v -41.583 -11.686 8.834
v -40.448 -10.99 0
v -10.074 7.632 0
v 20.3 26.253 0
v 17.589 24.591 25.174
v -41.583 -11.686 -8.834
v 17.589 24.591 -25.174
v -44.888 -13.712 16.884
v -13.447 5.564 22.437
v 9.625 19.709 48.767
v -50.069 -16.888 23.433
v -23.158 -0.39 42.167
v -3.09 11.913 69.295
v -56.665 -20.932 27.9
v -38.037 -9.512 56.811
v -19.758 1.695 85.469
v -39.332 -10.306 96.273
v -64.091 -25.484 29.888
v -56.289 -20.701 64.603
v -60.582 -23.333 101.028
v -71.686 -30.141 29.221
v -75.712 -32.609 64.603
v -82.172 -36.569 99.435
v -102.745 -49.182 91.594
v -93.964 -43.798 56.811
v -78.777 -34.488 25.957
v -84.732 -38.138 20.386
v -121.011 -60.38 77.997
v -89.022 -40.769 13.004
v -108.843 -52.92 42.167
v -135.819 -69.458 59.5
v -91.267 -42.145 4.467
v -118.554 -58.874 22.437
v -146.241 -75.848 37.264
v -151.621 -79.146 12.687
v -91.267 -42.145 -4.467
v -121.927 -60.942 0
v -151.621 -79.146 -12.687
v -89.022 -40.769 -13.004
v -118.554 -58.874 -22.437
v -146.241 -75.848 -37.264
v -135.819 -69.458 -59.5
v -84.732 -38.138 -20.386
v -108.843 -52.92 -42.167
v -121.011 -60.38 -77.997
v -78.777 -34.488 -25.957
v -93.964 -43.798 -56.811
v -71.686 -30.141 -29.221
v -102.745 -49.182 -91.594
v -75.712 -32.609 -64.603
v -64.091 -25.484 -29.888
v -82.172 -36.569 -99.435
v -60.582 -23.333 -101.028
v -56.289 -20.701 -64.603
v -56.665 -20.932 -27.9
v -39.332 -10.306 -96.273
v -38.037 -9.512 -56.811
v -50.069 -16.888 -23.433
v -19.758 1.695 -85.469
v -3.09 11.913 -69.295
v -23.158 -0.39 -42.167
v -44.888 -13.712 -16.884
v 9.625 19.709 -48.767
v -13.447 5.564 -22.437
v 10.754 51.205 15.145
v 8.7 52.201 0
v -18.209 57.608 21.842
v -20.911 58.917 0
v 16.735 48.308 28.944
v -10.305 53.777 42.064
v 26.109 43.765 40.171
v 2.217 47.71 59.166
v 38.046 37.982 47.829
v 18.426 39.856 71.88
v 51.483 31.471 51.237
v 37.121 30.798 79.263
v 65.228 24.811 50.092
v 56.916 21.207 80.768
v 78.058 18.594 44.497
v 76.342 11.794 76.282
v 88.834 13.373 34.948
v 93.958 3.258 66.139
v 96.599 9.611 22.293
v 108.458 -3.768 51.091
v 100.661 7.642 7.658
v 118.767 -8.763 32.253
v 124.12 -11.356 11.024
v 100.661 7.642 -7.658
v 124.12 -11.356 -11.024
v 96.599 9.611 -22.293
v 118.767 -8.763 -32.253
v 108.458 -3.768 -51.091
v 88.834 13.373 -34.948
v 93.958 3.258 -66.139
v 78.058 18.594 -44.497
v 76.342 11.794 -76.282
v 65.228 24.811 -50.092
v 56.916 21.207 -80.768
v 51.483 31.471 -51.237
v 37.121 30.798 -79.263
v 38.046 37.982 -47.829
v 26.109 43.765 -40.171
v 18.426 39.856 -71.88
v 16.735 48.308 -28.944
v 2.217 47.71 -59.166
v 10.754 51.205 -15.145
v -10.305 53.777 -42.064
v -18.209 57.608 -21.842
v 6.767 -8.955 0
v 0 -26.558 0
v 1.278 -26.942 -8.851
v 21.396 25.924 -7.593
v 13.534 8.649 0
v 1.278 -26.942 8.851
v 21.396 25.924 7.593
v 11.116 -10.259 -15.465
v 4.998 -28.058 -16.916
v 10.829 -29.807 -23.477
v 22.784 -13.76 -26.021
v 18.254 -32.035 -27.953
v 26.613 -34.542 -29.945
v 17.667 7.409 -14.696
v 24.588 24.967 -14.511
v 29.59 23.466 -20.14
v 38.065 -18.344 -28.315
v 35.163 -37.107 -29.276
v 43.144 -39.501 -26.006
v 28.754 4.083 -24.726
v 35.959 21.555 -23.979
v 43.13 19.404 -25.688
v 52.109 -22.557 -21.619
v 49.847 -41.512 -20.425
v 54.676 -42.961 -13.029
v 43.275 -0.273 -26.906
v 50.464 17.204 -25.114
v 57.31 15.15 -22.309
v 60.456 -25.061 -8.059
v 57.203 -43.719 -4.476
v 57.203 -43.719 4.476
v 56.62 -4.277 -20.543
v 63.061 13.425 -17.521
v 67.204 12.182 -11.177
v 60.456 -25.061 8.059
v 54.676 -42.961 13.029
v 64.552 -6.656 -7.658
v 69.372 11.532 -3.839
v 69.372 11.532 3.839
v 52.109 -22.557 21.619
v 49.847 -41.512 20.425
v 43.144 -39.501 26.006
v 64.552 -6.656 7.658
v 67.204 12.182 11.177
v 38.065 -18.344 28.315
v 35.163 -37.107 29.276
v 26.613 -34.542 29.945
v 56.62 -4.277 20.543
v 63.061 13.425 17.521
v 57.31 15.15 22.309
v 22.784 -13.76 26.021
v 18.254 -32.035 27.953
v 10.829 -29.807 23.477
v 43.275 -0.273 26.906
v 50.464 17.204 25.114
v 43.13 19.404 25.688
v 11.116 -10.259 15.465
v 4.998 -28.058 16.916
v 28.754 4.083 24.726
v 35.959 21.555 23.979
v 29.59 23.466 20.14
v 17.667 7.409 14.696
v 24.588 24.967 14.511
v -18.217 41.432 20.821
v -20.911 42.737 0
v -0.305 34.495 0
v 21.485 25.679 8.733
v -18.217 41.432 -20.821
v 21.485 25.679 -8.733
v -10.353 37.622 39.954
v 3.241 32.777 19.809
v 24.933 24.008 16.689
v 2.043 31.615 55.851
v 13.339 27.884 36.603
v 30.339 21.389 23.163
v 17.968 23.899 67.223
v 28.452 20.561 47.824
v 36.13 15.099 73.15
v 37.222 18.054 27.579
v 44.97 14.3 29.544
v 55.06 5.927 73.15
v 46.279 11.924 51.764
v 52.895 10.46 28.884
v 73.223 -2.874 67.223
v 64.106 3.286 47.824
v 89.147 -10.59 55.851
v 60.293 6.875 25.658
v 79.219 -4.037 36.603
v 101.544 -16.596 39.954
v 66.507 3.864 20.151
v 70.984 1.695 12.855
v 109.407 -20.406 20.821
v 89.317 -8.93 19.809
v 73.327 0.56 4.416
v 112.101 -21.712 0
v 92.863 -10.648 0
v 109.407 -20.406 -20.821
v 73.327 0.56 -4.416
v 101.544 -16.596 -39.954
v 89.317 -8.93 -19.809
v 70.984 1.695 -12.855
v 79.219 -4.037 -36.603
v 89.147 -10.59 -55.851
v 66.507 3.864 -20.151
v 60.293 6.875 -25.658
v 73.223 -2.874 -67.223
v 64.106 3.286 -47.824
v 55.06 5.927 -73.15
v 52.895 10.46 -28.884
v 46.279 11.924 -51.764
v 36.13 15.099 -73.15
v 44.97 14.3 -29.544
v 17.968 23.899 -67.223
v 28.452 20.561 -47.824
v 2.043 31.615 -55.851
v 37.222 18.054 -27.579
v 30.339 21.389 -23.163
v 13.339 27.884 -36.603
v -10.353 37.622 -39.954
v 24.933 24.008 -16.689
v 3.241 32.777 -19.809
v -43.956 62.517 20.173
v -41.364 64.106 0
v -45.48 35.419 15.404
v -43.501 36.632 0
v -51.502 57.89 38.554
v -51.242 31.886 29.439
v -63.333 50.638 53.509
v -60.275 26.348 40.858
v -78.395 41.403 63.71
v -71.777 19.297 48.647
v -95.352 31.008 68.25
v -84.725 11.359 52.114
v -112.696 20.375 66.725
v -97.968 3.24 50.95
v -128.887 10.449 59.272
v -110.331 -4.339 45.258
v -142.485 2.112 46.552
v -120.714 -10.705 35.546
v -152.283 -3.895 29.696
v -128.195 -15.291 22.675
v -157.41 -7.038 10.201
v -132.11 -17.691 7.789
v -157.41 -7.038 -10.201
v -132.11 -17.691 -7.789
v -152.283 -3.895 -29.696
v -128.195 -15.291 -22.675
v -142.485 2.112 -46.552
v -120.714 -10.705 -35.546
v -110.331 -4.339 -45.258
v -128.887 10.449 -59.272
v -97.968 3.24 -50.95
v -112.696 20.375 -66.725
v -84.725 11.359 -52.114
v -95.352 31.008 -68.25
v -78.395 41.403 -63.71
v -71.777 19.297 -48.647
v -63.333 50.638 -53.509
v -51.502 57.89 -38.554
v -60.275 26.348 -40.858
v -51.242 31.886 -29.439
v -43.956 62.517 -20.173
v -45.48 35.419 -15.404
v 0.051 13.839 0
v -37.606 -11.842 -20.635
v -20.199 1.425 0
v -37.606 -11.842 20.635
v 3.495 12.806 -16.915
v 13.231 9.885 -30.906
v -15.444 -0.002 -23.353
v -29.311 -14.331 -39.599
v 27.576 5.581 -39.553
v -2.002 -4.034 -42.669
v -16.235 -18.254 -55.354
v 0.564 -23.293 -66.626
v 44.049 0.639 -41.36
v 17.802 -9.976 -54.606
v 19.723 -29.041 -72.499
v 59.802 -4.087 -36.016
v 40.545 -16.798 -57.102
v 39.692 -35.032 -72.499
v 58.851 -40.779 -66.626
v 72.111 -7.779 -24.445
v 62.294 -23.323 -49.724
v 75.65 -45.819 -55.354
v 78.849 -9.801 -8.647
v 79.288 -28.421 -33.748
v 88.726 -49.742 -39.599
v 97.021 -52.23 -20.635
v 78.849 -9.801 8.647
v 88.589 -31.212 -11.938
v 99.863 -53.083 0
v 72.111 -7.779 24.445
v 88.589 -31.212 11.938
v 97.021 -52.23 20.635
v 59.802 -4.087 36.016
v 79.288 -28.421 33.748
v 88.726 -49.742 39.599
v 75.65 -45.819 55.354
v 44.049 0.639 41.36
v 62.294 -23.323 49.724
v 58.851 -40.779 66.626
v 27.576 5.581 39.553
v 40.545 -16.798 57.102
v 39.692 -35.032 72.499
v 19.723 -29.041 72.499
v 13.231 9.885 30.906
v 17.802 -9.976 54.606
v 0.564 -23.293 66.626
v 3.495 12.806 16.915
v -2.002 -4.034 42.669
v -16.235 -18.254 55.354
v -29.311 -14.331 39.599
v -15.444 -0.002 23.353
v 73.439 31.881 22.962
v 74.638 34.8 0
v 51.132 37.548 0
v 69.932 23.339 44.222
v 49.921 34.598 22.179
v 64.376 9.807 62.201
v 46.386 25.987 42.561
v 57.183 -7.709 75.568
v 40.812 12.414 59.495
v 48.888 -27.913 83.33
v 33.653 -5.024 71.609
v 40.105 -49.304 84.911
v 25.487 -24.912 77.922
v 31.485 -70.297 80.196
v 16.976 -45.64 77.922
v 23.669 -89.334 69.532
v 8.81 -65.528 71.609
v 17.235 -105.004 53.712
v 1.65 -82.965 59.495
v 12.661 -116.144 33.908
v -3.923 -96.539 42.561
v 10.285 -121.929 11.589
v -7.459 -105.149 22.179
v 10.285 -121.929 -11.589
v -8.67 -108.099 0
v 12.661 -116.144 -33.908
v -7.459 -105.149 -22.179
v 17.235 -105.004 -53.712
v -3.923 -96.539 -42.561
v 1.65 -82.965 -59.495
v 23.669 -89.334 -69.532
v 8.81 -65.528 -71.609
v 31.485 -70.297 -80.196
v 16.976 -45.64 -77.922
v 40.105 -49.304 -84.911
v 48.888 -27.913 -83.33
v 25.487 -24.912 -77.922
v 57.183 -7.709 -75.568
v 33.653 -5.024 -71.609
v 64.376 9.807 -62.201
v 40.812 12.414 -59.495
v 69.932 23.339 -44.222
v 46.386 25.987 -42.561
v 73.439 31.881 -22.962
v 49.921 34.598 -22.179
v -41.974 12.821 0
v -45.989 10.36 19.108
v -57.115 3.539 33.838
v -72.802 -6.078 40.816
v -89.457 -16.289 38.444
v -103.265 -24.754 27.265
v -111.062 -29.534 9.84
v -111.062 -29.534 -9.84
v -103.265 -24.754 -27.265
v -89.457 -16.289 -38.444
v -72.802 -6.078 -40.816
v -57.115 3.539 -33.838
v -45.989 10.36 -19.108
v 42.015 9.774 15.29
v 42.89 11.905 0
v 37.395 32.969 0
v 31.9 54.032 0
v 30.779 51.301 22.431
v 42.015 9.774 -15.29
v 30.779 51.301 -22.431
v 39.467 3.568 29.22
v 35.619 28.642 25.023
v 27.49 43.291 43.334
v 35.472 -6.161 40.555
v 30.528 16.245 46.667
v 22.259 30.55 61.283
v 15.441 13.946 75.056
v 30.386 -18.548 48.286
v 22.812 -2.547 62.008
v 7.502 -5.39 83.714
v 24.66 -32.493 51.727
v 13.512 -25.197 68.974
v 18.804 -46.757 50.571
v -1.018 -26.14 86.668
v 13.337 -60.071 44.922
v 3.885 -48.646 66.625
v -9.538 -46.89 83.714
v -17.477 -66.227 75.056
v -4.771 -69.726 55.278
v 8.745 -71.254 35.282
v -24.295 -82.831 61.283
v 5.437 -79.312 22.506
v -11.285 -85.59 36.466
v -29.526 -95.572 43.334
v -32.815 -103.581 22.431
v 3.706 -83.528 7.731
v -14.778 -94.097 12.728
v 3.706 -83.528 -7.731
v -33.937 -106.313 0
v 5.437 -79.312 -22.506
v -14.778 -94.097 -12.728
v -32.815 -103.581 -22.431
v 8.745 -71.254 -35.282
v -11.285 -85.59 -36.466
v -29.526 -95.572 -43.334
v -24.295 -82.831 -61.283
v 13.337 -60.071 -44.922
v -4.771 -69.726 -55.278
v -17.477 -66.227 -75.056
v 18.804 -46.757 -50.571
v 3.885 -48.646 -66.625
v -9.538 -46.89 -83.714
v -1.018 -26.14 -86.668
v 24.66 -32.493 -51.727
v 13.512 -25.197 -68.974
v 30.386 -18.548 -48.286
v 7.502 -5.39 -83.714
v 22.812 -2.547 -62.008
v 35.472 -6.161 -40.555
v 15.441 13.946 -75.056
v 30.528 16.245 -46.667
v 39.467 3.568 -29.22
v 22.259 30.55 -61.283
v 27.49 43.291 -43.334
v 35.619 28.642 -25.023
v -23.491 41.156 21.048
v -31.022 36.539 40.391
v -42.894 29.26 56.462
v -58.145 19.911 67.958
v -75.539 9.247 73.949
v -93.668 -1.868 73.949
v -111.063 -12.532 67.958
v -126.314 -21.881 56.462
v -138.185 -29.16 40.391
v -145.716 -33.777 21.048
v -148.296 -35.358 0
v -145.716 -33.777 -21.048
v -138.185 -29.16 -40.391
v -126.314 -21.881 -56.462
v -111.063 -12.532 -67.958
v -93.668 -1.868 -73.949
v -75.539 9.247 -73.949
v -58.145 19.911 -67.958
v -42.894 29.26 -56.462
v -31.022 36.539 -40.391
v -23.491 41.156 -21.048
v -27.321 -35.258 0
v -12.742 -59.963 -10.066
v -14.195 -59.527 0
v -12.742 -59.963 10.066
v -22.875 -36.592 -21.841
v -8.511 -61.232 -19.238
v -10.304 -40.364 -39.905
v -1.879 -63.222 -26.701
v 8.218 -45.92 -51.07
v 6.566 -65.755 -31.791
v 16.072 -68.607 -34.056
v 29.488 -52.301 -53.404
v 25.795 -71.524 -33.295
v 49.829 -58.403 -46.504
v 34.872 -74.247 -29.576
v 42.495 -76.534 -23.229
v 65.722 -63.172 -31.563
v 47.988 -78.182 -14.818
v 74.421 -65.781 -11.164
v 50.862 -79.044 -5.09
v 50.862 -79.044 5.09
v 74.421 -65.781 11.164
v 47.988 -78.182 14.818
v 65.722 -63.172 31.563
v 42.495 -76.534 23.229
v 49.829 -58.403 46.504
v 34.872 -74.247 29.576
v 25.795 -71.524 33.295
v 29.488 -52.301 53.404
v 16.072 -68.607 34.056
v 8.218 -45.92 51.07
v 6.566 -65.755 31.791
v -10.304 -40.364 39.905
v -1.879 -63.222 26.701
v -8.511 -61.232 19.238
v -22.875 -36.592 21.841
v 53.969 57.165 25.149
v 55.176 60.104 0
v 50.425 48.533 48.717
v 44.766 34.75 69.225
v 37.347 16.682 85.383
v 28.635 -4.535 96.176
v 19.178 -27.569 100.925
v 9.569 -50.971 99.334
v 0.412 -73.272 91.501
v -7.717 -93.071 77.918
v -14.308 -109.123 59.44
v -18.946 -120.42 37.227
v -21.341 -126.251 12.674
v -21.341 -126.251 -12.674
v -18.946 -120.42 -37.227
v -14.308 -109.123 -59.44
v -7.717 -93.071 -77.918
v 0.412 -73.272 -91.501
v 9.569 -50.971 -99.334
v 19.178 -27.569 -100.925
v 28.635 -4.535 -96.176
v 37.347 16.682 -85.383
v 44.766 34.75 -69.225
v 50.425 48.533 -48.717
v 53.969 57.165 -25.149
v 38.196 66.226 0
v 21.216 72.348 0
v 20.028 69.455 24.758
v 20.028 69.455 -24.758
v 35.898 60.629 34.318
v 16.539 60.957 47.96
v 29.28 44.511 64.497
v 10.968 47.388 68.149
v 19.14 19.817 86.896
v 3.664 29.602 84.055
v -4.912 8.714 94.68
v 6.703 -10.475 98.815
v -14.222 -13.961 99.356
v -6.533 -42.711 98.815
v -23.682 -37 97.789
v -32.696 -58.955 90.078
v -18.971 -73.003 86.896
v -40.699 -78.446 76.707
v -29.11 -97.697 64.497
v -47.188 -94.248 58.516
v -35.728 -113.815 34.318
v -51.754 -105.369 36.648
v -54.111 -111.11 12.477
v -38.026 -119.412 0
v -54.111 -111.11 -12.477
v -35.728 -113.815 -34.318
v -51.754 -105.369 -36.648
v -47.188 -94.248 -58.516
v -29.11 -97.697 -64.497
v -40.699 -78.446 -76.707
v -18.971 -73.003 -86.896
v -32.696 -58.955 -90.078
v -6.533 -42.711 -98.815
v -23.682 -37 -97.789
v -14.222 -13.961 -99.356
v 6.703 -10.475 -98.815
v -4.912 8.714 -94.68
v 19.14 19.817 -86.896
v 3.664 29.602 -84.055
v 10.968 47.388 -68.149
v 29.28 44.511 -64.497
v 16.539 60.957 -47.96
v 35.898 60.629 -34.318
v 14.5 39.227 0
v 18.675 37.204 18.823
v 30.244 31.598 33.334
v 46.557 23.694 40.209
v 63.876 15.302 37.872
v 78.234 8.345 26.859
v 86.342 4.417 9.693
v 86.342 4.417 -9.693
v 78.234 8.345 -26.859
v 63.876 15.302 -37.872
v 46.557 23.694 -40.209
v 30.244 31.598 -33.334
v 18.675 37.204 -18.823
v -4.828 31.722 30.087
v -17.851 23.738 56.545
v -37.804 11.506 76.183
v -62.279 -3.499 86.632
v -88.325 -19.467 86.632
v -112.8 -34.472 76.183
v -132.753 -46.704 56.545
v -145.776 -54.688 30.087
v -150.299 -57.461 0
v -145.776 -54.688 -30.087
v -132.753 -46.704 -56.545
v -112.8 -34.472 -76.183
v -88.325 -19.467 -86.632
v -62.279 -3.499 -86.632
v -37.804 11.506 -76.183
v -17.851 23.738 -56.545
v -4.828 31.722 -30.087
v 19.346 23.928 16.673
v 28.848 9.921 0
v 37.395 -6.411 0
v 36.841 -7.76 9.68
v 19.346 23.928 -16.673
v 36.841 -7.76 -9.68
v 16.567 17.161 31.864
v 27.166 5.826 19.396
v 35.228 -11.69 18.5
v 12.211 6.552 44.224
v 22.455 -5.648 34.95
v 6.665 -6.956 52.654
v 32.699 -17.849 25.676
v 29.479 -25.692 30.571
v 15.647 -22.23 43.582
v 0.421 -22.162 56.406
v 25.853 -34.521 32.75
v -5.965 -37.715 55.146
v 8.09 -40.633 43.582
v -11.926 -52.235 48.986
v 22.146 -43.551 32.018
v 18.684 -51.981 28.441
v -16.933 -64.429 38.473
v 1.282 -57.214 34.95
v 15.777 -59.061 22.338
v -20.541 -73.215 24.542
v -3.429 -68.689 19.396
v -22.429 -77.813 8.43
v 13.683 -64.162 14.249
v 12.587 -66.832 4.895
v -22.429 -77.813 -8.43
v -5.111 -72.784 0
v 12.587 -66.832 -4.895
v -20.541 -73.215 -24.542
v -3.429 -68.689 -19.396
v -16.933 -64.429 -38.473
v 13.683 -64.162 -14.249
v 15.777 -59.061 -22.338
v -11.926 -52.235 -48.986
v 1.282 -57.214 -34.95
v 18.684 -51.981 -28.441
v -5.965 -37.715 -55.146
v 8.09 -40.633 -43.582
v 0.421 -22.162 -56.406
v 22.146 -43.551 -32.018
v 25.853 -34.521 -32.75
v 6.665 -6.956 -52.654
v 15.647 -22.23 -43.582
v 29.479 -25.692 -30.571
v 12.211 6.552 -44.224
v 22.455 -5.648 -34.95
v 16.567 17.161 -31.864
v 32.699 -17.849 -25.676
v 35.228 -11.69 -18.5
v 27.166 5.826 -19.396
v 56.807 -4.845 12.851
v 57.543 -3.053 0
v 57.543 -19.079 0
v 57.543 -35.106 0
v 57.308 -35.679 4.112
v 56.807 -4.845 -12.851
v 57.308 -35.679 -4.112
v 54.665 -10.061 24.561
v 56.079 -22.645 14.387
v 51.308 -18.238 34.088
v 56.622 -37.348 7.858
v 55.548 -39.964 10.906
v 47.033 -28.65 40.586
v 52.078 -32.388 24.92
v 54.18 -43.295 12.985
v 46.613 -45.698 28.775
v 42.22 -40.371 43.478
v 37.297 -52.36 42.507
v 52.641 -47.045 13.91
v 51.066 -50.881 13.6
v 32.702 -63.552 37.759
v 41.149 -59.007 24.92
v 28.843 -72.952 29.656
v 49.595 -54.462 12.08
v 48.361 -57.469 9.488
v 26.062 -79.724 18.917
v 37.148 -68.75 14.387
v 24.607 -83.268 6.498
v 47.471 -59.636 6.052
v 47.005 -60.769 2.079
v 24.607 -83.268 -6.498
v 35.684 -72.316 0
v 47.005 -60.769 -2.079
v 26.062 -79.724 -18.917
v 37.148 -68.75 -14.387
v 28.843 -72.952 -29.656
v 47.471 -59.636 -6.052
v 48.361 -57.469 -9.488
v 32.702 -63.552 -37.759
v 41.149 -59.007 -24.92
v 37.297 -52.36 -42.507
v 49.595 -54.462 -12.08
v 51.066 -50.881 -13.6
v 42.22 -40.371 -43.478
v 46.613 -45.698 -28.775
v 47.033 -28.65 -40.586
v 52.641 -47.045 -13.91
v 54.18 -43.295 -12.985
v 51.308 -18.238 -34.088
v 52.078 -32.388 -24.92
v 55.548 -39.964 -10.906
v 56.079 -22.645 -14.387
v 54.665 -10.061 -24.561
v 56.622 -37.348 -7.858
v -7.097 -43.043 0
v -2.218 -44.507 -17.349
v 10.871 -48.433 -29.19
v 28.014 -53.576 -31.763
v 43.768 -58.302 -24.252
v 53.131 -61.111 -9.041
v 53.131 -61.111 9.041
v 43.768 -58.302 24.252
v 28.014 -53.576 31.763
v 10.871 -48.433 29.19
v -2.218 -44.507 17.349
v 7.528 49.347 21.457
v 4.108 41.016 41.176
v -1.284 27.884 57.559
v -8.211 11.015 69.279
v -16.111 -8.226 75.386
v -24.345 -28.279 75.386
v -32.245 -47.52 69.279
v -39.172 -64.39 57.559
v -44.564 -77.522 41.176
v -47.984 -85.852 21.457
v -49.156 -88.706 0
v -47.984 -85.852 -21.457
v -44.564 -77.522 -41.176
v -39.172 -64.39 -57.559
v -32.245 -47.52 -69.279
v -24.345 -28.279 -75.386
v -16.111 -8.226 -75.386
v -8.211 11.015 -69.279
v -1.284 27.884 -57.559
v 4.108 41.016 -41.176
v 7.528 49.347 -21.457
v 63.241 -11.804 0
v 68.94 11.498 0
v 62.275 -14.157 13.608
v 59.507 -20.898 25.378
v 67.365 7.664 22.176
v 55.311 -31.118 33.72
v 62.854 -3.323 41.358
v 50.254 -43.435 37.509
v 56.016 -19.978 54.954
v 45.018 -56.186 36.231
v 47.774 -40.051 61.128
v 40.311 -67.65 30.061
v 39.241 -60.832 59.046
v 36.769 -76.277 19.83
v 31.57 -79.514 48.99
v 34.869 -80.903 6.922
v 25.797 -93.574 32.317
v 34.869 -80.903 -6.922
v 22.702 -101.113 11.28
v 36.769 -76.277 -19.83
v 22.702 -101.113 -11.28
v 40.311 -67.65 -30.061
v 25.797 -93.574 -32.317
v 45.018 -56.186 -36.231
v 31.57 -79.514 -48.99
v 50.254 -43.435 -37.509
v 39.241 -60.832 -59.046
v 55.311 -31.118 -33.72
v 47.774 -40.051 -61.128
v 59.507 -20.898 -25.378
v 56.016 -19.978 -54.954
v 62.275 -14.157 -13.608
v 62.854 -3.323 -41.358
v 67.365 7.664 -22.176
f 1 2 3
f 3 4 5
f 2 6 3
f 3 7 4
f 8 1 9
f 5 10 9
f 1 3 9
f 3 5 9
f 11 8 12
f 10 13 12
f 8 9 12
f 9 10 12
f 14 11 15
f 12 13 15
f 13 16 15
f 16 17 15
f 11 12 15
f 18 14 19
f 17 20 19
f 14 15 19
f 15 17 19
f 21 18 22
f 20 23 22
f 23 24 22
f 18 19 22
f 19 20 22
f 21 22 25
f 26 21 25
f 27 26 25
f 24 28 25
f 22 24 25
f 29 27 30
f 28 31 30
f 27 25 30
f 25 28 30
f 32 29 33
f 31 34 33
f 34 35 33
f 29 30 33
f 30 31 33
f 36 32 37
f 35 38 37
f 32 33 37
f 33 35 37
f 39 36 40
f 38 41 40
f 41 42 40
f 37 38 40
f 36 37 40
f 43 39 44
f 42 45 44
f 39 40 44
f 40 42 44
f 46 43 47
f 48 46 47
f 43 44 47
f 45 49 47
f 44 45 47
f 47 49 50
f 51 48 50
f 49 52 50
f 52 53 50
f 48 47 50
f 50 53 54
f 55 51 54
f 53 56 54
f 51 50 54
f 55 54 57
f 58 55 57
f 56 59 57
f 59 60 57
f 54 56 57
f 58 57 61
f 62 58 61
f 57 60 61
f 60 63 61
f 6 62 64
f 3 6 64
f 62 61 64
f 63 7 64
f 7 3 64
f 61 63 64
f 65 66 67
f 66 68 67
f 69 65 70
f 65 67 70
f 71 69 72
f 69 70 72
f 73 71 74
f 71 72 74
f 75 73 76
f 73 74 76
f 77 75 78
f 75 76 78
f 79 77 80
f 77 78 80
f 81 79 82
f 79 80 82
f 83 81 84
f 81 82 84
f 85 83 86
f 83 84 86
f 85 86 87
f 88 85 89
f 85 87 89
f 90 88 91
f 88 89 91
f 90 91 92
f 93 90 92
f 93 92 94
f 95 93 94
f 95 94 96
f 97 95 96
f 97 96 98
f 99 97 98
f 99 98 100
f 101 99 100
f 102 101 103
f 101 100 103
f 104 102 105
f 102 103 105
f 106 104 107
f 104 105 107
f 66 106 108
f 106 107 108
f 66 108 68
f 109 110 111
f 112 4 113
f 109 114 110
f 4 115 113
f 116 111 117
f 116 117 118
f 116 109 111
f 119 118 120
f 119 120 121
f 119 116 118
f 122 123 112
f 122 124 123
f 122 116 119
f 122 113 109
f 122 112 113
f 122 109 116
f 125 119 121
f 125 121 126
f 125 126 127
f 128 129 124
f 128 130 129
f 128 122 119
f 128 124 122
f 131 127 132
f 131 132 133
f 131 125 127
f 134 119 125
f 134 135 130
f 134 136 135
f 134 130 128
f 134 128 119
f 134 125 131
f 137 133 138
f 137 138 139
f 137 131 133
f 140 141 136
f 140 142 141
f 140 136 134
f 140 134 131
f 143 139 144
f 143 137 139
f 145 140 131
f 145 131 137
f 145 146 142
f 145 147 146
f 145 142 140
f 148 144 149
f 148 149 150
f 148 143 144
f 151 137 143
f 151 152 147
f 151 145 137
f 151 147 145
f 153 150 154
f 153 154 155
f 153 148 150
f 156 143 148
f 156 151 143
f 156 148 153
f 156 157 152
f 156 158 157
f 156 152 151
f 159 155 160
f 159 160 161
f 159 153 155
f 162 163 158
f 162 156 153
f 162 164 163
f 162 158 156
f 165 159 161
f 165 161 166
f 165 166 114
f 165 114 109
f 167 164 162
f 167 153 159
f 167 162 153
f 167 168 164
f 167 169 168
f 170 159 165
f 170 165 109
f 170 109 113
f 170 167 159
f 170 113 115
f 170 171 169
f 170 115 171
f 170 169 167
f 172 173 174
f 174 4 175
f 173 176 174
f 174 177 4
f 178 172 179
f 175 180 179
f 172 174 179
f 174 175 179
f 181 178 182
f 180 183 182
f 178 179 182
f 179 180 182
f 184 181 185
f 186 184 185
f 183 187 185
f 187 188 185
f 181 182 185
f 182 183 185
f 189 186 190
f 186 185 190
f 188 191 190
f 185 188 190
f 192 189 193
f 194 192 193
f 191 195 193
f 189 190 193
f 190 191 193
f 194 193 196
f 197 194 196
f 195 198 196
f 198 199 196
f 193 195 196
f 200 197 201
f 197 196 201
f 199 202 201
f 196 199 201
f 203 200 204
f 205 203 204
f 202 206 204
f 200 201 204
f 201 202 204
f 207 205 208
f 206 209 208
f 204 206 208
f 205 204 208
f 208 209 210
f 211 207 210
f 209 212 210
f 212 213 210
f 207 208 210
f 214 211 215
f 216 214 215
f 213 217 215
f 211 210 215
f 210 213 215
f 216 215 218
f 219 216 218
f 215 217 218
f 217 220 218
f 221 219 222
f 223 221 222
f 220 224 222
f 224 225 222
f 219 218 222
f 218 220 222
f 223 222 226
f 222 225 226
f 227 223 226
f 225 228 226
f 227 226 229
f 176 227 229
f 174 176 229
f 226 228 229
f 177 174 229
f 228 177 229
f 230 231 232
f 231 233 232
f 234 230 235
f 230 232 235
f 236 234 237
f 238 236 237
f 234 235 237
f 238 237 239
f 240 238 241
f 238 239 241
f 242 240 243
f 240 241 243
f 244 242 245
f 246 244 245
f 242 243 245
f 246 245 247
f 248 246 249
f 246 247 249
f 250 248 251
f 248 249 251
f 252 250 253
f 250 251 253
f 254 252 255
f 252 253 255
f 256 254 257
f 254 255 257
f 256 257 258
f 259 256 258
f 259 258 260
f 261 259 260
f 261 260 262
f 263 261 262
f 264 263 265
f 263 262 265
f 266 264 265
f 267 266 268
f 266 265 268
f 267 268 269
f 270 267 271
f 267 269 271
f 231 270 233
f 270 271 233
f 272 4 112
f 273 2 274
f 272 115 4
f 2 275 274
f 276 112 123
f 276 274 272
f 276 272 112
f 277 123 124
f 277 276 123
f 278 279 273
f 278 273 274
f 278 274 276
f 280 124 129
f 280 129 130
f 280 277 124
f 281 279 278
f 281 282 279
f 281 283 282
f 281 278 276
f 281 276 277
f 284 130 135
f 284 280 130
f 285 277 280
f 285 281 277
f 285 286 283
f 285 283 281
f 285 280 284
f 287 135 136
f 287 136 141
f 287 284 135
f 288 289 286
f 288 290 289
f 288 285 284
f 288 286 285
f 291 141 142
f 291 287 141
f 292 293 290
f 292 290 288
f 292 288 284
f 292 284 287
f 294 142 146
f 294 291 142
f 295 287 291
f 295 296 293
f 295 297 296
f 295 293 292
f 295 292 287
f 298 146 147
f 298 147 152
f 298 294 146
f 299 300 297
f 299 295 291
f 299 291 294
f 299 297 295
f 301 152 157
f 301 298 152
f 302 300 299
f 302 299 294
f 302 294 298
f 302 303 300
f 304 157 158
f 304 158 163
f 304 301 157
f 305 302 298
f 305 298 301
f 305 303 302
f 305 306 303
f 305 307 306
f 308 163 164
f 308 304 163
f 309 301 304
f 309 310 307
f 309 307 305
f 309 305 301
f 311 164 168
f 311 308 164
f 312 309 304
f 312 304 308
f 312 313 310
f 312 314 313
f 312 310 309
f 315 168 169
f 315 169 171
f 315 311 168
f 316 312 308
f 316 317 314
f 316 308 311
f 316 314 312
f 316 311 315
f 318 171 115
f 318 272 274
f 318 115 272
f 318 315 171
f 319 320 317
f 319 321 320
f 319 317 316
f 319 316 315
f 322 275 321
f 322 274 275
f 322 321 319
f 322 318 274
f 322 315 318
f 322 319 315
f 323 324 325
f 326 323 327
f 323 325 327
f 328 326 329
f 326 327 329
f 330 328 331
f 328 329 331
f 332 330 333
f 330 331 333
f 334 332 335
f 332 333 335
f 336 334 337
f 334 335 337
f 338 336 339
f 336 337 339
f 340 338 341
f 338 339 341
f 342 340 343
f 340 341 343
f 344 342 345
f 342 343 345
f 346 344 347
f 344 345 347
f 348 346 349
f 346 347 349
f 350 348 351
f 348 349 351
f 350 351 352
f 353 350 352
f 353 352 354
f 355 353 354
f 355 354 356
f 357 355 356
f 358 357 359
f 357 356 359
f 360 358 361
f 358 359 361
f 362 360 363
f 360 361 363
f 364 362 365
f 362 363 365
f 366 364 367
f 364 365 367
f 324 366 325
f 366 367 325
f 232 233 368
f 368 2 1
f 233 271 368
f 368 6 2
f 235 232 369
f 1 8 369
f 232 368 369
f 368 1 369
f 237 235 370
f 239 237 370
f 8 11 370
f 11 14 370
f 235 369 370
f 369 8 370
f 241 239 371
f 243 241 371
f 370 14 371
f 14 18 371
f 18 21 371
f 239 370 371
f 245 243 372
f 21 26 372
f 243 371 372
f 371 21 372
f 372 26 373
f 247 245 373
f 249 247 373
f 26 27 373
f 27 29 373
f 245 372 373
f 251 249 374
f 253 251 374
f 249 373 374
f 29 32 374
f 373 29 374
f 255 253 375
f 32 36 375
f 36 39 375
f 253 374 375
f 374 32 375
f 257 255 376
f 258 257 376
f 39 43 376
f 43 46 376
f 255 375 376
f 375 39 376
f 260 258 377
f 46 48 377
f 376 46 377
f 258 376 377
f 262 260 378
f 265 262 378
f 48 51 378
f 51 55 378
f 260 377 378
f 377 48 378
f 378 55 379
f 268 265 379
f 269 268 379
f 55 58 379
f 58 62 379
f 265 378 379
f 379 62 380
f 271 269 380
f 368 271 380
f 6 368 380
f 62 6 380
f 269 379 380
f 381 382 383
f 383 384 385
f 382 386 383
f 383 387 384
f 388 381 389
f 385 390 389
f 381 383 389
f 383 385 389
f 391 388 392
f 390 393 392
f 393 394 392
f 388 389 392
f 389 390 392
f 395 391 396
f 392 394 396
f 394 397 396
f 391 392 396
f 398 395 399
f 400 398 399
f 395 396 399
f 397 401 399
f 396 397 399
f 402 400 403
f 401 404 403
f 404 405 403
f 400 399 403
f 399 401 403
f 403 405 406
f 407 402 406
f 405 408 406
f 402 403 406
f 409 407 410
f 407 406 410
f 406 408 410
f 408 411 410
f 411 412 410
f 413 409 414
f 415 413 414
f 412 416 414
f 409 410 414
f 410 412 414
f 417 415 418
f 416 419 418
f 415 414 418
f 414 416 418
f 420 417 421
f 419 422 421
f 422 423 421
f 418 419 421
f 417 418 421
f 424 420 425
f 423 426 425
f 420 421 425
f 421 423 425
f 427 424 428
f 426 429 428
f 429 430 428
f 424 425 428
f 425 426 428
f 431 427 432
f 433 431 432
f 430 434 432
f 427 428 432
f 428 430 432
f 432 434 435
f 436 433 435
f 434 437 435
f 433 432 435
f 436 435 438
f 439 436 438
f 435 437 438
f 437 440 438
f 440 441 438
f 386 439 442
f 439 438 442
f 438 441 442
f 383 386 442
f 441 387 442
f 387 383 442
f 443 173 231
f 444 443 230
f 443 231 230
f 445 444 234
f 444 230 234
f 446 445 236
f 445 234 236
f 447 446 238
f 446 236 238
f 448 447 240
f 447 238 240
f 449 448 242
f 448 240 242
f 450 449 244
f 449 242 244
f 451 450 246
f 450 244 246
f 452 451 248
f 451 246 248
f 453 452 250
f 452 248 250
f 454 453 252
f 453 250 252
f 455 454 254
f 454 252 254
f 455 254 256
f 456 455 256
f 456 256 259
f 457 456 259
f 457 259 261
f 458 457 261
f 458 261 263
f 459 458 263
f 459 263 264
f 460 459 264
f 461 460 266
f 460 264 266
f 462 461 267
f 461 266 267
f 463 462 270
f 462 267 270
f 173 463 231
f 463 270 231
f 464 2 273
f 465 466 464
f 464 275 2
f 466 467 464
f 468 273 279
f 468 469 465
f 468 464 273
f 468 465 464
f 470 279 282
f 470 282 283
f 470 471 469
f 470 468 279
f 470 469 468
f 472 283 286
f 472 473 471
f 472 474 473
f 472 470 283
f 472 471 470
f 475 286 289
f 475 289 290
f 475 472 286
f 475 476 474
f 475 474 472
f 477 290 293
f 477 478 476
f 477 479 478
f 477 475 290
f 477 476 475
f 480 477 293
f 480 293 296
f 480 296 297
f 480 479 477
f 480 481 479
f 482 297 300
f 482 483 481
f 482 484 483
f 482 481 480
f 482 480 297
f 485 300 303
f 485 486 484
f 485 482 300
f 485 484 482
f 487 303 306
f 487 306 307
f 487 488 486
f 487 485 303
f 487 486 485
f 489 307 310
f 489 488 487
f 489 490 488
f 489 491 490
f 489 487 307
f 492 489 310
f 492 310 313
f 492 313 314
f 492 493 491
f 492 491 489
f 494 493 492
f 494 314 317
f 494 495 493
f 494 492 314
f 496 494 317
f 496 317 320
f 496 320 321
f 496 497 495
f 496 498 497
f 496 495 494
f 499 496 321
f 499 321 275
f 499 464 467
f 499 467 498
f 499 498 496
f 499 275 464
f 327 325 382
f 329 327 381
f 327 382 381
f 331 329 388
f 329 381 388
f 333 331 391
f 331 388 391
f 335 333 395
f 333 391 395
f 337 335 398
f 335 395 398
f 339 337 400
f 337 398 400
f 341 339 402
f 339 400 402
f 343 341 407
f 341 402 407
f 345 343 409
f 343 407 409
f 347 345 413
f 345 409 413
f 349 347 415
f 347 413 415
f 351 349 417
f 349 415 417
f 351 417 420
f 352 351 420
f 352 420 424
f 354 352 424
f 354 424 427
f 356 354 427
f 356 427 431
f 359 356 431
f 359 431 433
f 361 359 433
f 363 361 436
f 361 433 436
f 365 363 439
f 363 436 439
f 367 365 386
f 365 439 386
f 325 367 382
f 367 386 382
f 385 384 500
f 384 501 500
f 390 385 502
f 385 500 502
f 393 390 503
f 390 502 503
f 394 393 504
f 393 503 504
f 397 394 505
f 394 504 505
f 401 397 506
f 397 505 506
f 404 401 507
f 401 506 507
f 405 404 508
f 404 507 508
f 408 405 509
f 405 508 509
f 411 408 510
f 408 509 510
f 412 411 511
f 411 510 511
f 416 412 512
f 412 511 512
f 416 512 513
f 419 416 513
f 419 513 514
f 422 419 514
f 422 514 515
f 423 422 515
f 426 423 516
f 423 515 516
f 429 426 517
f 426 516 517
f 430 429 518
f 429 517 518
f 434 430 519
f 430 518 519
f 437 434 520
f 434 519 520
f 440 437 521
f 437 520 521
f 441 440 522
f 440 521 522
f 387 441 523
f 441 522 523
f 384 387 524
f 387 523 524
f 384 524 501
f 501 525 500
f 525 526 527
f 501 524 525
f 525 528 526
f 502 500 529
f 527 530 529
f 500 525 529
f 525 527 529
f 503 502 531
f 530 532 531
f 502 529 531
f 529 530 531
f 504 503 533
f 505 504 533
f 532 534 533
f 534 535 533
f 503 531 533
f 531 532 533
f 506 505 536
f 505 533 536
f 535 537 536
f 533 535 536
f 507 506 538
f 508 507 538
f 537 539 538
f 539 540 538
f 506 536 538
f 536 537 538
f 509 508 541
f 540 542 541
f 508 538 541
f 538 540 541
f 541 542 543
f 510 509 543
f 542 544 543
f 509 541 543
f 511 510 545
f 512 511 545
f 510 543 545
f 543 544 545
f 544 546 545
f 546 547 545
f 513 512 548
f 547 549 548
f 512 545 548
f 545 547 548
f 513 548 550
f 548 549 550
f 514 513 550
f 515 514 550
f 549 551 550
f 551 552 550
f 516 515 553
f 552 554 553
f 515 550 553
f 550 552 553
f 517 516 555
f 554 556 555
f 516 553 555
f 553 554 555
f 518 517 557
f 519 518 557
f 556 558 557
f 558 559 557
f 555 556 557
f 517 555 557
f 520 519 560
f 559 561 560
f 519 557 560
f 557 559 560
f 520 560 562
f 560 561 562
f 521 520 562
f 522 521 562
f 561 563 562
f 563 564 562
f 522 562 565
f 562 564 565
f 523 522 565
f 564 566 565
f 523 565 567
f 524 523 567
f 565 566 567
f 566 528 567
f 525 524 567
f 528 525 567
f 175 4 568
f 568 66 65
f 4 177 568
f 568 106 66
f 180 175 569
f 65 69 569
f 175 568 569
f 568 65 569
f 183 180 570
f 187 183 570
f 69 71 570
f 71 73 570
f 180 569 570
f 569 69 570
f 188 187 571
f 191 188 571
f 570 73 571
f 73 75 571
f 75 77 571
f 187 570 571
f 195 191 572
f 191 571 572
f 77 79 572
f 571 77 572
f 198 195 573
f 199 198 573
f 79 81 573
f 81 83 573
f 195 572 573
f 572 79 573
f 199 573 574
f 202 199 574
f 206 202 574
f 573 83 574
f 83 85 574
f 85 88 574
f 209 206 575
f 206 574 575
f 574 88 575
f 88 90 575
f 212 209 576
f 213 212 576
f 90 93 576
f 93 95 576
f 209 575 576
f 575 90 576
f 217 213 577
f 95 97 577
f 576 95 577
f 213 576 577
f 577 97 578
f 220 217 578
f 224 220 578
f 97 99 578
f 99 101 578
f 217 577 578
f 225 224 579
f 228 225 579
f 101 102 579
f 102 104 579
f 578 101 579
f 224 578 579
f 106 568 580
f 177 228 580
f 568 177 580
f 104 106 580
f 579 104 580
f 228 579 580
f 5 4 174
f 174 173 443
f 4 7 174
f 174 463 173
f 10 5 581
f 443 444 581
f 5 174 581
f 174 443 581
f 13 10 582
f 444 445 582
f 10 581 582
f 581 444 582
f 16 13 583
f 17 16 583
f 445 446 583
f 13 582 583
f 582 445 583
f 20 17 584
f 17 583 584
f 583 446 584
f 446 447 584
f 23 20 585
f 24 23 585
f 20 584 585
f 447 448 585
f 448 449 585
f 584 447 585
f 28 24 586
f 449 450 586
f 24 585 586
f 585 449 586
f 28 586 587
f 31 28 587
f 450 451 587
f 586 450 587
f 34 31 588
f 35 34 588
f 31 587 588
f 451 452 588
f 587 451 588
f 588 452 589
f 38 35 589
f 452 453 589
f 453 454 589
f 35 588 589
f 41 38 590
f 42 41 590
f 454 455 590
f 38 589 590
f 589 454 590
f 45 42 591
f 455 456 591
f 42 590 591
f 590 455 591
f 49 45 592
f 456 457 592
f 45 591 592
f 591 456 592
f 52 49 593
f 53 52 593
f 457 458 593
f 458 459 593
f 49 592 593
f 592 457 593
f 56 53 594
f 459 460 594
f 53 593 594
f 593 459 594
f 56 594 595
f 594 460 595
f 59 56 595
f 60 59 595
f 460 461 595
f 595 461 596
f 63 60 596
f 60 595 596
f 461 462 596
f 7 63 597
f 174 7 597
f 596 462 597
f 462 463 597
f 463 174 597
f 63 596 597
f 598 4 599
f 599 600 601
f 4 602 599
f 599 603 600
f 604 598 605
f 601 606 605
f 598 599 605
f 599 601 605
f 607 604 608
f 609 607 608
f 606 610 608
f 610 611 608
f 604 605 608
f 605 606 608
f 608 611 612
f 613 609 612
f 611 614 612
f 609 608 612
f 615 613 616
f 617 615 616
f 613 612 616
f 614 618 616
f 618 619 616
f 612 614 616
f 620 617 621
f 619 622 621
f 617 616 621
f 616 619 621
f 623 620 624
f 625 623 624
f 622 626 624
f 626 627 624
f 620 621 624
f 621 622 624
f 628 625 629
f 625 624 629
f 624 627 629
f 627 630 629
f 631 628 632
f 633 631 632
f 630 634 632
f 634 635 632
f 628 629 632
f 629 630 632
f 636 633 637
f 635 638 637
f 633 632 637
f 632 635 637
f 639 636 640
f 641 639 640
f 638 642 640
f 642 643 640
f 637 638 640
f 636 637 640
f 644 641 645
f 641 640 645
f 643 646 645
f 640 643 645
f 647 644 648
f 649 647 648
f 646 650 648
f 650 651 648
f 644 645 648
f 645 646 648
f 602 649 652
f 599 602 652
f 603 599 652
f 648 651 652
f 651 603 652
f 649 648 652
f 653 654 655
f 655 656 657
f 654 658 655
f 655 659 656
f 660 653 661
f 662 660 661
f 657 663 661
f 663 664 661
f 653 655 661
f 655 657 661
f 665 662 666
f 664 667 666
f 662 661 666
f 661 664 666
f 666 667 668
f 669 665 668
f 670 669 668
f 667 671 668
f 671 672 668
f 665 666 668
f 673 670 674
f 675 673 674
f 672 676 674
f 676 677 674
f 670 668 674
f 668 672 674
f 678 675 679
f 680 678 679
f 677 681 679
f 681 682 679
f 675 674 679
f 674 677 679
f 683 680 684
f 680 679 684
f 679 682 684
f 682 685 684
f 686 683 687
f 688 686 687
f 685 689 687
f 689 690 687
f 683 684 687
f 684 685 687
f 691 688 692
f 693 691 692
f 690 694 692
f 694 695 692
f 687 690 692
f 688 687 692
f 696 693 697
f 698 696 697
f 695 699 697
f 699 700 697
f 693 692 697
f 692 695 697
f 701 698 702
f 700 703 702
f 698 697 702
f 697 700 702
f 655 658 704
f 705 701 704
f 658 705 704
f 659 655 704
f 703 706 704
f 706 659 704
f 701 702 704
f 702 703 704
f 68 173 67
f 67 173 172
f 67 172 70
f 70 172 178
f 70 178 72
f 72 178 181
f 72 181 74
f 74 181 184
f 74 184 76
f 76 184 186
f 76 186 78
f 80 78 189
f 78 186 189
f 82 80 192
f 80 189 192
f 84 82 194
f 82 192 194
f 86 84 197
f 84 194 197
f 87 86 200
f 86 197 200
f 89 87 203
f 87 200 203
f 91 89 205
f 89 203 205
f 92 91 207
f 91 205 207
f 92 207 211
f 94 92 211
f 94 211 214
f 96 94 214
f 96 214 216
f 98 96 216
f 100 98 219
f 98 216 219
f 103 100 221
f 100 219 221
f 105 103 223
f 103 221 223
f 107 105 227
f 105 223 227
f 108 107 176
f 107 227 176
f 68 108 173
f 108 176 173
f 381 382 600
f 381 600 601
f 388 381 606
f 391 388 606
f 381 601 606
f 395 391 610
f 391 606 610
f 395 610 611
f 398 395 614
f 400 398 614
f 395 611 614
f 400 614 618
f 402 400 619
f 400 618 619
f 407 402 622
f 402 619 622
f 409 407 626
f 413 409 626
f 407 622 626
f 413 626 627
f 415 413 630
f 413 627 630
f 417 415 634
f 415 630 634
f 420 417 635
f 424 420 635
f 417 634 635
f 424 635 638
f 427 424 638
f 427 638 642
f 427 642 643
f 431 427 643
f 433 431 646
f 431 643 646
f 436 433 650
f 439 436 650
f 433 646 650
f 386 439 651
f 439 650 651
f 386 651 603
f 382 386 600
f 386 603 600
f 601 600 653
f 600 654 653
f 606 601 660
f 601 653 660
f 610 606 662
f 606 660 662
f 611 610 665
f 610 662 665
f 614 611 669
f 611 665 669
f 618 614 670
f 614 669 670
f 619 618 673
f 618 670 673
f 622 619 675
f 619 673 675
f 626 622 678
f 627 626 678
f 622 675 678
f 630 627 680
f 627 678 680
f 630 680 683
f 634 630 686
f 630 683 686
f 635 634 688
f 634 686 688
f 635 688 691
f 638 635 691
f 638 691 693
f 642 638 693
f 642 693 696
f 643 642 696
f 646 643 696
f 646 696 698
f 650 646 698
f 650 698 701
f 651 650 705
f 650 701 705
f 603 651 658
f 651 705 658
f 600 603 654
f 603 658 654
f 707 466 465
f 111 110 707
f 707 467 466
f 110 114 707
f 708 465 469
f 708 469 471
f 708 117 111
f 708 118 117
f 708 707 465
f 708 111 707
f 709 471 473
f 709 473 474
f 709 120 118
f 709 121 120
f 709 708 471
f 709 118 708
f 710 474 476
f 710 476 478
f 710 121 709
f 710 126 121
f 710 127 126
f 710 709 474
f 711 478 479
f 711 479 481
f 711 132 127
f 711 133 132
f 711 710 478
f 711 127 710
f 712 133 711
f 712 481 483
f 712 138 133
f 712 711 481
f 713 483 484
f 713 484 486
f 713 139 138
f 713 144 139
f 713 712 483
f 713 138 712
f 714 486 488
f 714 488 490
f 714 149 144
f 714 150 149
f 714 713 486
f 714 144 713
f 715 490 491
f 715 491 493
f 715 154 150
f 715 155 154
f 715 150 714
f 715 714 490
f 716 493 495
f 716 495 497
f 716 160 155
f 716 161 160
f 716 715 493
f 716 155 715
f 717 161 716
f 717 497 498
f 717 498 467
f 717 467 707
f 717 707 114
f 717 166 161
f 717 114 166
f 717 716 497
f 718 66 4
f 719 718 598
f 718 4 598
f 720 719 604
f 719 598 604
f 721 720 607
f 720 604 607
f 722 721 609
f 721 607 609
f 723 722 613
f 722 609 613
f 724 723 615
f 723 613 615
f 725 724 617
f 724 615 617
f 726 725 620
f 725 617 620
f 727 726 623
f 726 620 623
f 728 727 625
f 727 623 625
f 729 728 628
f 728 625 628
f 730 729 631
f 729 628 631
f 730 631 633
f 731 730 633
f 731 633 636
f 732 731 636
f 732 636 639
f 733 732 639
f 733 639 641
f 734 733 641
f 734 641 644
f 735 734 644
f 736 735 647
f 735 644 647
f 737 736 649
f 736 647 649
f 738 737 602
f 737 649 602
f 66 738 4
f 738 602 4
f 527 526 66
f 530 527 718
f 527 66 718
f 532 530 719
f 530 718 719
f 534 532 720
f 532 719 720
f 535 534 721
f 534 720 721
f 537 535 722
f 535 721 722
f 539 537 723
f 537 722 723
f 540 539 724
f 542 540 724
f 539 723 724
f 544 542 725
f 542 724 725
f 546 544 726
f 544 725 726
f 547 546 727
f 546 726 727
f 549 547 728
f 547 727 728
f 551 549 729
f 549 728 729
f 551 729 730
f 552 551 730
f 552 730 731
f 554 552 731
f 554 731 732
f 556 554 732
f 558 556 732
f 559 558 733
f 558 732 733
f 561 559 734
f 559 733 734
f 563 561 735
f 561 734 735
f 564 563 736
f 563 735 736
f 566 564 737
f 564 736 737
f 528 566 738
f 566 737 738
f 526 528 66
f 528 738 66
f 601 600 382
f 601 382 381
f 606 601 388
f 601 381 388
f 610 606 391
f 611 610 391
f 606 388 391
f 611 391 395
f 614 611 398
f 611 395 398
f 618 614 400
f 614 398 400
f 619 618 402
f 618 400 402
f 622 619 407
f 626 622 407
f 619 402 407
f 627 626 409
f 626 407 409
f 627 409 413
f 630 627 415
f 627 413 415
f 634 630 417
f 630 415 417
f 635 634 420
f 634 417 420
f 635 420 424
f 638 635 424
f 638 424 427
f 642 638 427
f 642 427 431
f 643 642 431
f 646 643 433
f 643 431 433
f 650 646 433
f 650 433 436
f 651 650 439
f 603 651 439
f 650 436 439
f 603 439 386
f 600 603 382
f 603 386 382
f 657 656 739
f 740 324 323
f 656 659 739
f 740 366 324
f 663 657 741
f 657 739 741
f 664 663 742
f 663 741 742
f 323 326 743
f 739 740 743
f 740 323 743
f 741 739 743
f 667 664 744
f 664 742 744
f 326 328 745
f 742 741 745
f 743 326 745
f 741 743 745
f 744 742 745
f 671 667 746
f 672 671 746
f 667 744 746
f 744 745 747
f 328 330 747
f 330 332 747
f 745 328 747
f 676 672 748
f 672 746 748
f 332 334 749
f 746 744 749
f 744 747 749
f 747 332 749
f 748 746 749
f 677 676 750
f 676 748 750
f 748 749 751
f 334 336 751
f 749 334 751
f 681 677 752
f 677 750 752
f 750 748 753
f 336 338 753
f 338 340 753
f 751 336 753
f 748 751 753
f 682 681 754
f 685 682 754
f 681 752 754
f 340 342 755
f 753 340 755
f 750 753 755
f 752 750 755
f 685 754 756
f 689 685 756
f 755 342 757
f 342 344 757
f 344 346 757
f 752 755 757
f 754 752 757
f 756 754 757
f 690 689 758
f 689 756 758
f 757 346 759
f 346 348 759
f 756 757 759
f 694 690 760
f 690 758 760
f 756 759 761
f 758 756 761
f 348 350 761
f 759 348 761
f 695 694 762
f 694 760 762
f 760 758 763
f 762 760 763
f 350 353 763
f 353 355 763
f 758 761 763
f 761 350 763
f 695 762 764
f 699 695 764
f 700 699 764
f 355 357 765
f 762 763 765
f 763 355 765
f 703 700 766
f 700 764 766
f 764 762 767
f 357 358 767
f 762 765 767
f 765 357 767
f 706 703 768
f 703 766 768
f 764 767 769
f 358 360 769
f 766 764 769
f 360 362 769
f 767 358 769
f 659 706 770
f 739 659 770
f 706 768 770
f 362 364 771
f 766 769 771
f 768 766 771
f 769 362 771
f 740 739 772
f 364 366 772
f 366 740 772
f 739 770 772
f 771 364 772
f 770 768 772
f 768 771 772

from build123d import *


with BuildPart() as f1:
    # F0 (on Top) → F1 (revolve)
    with BuildSketch(Plane.XY):
        Polygon((-41.363727, 64.106137), (-43.500599, 36.632076), (-40.447924, -10.989628), (20.300273, 26.252987), (-20.910814, 42.737424), align=None)
    revolve(axis=Axis((-61.333209, -34.267869, 0), (0.522663, -0.85254, 0)))


with BuildPart() as f2:
    # F0 (on Top) → F2 (revolve)
    with BuildSketch(Plane.XY):
        Polygon((-20.910814, 42.737424), (20.300273, 26.252987), (8.700117, 52.200712), (-20.910814, 58.916591), align=None)
    revolve(axis=Axis((30.221465, -21.216084, 0), (0.436046, 0.899924, 0)))


with BuildPart() as f3:
    # F0 (on Top) → F3 (revolve)
    with BuildSketch(Plane.XY):
        Polygon((8.700117, 52.200712), (20.300273, 26.252987), (37.395246, -6.410618), (42.890061, 11.905423), (31.900436, 54.032315), (55.175854, 60.104163), (21.21608, 72.348356), align=None)
    revolve(axis=Axis((11.523842, -31.289906, 0), (0.925058, -0.379825, 0)))


with BuildPart() as f4:
    # F0 (on Top) → F4 (revolve)
    with BuildSketch(Plane.XY):
        Polygon((20.300273, 26.252987), (-40.447924, -10.989628), (-14.194934, -59.527136), (0, -26.558263), align=None)
    revolve(axis=Axis((40.142654, 2.747403, 0), (-0.287348, -0.957826, 0)))


with BuildPart() as f5:
    # F0 (on Top) → F5 (revolve)
    with BuildSketch(Plane.XY):
        Polygon((42.890061, 11.905423), (37.395246, -6.410618), (57.54289, -3.052677), (57.54289, -35.105746), (74.63786, 34.800474), (51.13228, 37.547879), align=None)
    revolve(axis=Axis((11.523842, -31.289906, 0), (0.925058, -0.379825, 0)))


solid = Compound([f1.part, f2.part, f3.part, f4.part, f5.part])
